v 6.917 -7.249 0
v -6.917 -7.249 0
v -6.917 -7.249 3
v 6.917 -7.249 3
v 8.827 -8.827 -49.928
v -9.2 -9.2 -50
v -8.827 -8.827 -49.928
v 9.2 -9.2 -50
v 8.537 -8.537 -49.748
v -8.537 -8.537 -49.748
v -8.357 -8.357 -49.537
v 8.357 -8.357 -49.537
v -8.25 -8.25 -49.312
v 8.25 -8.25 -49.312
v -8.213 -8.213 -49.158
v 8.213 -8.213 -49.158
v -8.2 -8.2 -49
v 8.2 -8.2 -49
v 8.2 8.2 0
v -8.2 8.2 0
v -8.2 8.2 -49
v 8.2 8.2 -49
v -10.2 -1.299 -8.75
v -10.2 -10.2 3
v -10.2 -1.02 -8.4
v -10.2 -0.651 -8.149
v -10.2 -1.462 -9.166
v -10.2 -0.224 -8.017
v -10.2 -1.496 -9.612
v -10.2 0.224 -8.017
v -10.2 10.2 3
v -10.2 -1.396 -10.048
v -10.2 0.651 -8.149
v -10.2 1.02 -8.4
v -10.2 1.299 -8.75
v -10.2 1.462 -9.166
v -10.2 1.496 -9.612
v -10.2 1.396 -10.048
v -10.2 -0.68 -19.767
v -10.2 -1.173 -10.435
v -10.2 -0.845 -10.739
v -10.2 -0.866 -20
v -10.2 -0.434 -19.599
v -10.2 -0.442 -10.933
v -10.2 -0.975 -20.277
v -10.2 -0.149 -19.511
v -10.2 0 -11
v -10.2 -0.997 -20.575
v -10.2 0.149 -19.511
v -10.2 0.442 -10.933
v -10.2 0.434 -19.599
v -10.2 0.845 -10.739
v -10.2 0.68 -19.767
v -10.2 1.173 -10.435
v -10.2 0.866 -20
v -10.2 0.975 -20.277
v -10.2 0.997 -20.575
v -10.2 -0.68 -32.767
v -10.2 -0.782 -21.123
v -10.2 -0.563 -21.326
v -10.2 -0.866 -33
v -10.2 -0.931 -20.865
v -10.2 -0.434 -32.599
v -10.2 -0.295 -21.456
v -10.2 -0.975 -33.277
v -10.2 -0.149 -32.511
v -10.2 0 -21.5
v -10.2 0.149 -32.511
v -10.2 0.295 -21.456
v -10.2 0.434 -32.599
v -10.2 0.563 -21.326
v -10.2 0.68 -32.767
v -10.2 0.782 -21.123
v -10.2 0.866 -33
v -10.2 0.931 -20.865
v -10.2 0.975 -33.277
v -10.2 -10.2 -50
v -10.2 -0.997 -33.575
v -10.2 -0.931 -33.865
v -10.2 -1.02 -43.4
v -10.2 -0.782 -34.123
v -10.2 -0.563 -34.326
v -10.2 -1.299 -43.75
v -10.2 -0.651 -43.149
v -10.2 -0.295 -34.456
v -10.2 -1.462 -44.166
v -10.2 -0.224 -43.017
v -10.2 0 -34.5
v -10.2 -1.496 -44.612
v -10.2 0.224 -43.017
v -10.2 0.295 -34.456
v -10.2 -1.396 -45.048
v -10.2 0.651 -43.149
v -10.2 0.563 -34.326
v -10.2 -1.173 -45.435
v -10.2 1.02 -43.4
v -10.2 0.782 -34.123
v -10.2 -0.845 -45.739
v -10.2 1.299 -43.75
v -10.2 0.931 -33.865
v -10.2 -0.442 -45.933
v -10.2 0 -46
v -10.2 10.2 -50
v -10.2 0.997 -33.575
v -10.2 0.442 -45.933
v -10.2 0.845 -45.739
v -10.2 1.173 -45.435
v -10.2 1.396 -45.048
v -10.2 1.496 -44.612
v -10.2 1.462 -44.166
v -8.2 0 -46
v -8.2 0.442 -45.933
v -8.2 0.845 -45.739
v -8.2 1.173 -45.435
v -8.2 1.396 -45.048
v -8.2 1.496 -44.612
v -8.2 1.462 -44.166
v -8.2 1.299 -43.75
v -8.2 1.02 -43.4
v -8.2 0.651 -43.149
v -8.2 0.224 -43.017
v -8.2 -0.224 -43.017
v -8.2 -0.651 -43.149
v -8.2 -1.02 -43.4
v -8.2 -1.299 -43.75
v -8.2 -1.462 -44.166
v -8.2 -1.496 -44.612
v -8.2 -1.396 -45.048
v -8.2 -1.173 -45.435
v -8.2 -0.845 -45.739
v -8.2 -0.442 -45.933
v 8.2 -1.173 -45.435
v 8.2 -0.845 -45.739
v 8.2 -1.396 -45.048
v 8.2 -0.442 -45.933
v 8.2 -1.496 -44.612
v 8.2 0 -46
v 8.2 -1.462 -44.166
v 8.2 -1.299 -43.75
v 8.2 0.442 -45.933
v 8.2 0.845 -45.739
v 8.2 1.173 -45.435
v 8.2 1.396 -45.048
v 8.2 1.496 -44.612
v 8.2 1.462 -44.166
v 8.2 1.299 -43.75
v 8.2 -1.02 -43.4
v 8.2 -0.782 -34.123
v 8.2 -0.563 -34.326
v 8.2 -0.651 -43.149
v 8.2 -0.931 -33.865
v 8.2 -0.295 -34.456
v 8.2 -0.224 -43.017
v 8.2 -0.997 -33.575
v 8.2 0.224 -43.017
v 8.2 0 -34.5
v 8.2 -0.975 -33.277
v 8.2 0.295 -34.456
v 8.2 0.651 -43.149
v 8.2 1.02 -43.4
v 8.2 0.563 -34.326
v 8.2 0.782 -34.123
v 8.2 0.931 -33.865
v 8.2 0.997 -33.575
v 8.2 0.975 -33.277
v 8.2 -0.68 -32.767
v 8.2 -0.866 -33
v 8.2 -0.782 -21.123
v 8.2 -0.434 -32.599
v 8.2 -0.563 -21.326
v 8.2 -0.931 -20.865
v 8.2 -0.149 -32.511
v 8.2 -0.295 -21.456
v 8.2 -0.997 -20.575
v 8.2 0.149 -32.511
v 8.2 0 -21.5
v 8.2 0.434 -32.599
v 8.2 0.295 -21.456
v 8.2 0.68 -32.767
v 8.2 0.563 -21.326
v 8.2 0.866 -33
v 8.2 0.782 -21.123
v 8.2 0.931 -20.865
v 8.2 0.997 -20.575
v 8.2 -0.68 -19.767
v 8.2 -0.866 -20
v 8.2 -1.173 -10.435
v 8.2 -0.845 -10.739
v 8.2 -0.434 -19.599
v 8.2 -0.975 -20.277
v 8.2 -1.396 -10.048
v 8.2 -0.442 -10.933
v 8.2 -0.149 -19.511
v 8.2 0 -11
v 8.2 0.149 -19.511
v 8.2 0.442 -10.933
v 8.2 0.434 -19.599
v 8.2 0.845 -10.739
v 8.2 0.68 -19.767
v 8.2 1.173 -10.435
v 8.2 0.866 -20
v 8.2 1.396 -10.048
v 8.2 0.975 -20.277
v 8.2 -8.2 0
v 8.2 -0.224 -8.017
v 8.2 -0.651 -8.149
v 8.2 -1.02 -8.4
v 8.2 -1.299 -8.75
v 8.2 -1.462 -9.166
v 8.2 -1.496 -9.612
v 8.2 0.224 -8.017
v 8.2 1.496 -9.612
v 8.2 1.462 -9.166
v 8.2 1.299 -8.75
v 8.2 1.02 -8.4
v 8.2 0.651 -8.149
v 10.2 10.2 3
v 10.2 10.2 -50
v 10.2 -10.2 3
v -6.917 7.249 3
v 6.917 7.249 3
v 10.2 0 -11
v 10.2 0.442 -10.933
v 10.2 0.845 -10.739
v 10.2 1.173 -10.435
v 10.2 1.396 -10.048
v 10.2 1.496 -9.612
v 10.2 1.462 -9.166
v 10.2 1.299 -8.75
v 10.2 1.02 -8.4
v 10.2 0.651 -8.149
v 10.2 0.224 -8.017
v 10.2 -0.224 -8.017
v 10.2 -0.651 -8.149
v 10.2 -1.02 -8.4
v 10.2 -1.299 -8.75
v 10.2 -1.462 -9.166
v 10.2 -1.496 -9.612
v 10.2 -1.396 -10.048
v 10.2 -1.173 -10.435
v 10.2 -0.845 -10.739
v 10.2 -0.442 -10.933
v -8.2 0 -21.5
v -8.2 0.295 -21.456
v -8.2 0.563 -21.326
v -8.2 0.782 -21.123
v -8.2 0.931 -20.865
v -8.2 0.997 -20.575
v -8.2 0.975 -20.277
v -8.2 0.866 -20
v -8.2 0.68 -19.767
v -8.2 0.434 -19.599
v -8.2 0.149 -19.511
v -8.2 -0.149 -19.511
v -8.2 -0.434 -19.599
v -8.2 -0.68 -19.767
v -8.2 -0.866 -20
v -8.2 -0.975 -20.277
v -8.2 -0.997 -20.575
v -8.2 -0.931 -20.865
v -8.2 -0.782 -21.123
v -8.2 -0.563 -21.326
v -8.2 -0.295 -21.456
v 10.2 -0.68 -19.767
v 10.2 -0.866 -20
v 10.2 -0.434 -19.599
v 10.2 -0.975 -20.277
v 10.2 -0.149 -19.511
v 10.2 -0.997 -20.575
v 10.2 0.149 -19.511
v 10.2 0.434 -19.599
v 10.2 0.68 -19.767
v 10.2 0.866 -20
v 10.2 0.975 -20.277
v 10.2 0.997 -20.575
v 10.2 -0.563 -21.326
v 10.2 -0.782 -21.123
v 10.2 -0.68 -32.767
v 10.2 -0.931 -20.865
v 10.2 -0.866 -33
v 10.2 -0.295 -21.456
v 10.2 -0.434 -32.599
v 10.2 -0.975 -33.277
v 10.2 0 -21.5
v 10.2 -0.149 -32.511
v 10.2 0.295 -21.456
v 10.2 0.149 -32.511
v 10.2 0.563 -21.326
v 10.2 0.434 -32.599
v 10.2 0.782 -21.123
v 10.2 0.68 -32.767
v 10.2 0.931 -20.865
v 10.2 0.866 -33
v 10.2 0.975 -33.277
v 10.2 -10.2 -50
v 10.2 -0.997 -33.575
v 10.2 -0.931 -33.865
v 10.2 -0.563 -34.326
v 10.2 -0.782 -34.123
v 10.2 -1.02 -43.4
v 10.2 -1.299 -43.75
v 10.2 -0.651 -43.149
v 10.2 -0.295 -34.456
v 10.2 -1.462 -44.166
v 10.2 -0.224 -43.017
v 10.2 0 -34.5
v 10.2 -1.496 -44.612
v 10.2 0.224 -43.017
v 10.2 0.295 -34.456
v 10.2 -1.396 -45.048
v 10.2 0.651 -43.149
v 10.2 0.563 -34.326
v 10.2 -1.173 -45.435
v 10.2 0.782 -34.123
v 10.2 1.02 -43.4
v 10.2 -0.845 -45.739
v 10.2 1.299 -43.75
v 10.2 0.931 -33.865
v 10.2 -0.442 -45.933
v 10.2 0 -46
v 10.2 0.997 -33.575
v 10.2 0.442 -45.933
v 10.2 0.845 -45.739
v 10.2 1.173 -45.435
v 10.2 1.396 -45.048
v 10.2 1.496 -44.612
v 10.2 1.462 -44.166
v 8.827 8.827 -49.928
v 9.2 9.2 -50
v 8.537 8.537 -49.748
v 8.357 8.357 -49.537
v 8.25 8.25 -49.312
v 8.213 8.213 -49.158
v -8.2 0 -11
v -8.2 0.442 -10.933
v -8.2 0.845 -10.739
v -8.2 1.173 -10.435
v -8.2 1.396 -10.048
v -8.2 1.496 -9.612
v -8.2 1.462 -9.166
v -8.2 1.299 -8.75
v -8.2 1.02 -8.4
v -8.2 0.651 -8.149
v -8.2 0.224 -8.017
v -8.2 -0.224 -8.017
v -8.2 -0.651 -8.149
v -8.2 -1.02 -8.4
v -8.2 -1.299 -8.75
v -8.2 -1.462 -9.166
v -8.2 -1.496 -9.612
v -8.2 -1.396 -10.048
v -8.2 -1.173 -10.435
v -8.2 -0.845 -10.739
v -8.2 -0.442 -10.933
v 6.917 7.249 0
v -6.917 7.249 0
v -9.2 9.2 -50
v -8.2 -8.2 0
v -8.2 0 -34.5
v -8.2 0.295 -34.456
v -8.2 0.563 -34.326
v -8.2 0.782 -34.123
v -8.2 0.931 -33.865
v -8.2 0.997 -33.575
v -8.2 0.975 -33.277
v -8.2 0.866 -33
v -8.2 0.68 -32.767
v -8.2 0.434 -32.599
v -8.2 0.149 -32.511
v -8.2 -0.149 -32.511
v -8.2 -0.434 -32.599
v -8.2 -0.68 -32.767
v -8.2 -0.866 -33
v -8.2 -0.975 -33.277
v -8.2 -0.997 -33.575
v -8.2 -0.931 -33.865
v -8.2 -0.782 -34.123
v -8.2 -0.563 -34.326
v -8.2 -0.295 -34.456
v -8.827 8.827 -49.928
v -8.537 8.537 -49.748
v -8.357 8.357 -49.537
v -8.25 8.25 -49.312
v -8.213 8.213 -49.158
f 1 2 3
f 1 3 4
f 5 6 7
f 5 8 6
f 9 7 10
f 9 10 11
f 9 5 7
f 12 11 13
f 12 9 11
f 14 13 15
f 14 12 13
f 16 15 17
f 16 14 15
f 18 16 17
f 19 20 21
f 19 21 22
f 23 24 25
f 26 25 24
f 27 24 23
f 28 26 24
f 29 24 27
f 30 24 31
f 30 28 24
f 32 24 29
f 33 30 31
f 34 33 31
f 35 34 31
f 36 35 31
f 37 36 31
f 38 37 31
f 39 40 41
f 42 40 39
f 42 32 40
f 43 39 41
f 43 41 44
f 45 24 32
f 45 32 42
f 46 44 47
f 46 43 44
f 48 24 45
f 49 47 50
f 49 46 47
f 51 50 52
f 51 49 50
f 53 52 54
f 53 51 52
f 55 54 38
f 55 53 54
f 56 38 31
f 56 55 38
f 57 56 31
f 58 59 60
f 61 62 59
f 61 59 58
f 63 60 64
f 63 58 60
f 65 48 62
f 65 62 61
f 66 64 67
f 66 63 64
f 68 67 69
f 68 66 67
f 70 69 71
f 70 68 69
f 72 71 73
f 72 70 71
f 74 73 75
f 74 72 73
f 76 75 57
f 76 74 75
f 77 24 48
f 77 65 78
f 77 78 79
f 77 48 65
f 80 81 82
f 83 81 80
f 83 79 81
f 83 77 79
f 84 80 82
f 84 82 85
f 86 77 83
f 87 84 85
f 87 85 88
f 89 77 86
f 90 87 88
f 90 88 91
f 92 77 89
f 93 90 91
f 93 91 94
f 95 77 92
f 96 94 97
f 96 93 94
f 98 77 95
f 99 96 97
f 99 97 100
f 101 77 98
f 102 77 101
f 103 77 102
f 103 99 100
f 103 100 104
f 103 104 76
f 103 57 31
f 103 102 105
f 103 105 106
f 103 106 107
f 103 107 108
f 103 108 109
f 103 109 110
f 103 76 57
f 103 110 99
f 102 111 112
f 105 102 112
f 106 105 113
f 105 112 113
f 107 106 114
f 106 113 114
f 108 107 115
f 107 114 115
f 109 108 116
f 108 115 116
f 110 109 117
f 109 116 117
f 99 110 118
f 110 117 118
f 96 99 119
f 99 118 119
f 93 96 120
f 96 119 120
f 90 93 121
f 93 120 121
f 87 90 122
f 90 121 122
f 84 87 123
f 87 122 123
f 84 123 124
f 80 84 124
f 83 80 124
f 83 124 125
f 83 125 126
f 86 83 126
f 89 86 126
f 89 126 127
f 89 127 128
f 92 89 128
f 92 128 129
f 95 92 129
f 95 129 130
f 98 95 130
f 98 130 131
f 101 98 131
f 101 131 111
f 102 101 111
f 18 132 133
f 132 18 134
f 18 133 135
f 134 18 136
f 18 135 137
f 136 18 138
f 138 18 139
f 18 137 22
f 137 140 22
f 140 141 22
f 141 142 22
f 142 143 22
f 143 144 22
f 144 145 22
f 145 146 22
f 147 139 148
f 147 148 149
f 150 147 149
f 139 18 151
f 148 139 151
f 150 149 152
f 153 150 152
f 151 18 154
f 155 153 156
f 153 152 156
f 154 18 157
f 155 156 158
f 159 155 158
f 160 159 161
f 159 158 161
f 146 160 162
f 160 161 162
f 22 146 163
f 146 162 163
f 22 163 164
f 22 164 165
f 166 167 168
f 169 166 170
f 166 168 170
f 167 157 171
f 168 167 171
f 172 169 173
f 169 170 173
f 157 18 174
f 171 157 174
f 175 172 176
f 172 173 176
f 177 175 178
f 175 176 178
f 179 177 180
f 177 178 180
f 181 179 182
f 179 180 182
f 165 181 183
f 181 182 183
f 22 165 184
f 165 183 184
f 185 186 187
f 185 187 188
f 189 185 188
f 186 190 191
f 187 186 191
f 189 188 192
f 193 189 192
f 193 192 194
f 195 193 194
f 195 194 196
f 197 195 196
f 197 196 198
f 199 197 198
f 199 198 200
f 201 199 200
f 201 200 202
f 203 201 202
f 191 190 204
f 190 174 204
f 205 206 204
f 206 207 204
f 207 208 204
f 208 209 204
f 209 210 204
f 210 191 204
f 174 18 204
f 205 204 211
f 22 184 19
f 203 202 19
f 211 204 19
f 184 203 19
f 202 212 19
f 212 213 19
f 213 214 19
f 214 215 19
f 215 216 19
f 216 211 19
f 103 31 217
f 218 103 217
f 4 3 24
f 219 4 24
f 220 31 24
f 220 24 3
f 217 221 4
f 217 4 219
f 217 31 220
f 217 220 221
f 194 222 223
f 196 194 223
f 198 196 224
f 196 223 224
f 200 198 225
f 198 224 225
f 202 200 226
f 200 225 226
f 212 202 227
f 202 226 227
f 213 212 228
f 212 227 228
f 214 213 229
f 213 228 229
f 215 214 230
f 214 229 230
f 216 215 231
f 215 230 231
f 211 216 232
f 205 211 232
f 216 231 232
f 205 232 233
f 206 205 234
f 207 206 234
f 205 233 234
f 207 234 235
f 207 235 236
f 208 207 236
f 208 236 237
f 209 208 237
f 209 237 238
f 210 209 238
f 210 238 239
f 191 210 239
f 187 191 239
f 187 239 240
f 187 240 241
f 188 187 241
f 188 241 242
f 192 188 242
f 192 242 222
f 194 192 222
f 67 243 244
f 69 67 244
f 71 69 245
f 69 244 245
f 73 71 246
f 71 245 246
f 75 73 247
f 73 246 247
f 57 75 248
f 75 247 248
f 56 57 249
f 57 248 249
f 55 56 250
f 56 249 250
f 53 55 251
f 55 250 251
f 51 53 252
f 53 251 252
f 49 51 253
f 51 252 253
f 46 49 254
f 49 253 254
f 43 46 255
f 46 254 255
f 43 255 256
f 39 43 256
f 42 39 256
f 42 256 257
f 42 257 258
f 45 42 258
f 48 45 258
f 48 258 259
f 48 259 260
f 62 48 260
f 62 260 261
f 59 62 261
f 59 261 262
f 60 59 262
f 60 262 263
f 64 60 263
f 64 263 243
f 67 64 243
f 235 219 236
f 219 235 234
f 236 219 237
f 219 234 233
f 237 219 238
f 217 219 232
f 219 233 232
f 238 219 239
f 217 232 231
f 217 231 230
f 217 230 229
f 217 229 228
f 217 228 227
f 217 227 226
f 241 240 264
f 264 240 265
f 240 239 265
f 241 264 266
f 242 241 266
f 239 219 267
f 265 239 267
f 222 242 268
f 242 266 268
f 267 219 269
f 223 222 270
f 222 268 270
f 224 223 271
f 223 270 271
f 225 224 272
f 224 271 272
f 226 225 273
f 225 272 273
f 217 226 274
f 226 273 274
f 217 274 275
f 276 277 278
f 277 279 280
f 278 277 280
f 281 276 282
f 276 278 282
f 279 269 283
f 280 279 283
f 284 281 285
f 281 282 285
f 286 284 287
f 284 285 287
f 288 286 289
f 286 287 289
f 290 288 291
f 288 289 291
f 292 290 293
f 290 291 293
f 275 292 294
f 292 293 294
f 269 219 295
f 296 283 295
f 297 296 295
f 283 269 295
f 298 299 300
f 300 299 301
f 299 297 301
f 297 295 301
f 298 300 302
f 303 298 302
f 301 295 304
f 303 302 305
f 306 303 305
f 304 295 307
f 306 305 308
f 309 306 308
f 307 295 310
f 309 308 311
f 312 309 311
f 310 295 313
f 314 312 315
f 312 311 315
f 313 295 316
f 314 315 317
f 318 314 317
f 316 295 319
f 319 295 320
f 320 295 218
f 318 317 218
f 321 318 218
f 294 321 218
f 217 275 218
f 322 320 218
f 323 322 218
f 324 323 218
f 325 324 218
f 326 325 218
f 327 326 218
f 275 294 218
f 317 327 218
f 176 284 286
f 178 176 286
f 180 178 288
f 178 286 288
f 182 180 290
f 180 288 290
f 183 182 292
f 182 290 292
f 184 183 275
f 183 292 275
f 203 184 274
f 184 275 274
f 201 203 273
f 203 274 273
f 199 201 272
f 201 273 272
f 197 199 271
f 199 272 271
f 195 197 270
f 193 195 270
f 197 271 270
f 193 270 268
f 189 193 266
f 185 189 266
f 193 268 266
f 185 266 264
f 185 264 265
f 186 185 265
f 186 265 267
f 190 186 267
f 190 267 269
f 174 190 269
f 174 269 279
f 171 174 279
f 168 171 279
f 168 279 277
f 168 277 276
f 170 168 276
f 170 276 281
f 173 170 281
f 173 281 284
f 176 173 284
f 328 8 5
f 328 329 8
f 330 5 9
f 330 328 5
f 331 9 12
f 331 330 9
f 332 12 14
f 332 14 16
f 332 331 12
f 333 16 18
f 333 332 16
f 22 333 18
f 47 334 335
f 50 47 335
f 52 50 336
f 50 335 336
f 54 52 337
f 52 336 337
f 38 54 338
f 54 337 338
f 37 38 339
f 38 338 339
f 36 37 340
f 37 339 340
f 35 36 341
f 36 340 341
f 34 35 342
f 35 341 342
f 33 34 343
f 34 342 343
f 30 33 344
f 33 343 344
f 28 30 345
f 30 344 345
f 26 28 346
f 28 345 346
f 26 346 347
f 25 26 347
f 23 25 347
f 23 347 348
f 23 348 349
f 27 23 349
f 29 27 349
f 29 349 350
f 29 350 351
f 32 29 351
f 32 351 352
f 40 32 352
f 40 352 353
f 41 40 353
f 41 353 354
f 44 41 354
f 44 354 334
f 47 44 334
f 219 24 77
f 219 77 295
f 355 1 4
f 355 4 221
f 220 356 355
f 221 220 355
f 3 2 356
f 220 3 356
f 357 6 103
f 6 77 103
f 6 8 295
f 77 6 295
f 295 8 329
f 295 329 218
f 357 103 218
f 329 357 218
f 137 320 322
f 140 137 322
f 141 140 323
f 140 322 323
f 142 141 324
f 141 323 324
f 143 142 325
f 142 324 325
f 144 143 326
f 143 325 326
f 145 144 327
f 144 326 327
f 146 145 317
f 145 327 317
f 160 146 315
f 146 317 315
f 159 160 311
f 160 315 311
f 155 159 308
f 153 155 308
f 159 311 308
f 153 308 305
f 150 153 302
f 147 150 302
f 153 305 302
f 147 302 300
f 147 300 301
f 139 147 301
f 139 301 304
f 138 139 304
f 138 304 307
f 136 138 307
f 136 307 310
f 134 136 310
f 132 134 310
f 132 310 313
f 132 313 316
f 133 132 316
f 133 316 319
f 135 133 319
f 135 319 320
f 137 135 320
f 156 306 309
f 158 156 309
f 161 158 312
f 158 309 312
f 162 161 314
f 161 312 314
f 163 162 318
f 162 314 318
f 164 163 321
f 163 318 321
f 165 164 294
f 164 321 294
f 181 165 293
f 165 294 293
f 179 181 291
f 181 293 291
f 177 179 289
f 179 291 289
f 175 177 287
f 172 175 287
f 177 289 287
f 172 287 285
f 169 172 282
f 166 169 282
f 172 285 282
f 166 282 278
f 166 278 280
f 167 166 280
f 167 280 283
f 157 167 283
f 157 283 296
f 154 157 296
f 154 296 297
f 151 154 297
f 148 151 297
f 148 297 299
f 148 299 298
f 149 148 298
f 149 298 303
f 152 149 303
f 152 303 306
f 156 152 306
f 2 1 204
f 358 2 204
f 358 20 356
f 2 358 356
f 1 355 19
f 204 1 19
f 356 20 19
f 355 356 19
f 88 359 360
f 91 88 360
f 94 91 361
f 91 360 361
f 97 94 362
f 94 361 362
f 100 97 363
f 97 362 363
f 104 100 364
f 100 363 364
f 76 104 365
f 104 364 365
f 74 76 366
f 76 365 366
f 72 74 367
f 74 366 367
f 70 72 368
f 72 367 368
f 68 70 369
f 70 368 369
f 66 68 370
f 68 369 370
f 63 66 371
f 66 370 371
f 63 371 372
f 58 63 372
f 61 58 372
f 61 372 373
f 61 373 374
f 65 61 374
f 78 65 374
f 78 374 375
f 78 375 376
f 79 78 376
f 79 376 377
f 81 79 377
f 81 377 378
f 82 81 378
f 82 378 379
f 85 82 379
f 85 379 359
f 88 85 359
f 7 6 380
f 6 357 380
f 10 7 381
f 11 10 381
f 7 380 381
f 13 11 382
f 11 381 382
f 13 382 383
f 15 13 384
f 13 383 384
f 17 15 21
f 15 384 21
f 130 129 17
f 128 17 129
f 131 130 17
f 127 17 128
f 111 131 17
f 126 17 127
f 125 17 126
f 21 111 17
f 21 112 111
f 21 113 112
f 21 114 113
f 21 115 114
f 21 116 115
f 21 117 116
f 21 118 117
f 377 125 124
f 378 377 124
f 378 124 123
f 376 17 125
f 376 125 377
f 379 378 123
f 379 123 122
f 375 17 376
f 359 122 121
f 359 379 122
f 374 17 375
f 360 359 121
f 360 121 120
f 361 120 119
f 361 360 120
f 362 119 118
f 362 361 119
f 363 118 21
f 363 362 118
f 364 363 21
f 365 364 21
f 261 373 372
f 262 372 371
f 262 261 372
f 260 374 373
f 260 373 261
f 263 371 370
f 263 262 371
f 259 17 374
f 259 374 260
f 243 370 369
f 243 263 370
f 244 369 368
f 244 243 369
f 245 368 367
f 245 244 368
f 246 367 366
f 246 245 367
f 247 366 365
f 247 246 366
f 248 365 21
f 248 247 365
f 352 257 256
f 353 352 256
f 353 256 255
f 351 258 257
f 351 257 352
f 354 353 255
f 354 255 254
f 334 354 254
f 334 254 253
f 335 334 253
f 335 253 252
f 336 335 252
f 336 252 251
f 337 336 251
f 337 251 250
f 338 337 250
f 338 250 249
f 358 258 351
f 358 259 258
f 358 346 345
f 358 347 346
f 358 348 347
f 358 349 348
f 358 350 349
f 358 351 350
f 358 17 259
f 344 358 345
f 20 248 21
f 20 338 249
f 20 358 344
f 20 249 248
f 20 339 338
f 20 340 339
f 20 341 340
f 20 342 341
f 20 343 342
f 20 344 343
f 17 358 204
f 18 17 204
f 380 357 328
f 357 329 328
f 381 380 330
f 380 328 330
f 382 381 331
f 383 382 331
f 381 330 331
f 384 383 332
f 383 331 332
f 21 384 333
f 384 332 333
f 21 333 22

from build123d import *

# Parameters (mm, degrees)
SKETCH1_W           = 20.4
SKETCH1_H           = 20.4
SKETCH1_W_2         = 16.4
SKETCH1_H_2         = 16.4
BOSS_EXTRUDE1_DEPTH = 50
SKETCH2_W           = 20.4
SKETCH2_H           = 20.4
SKETCH2_W_2         = 13.834702386
SKETCH2_H_2         = 14.497254018
BOSS_EXTRUDE2_DEPTH = 3
SKETCH3_R           = 1
SKETCH3_R_2         = 1.5
CUT_EXTRUDE1_DEPTH  = 55.956346312
FILLET1_R           = 1


with BuildPart() as part:
    # Sketch1 → Boss-Extrude1 (new body)
    with BuildSketch(Plane.XY):
        Rectangle(SKETCH1_W, SKETCH1_H)
        Rectangle(SKETCH1_W_2, SKETCH1_H_2, mode=Mode.SUBTRACT)
    extrude(amount=-BOSS_EXTRUDE1_DEPTH)

    # Sketch2 → Boss-Extrude2 (add)
    with BuildSketch(Plane.XY):
        Rectangle(SKETCH2_W, SKETCH2_H)
        Rectangle(SKETCH2_W_2, SKETCH2_H_2, mode=Mode.SUBTRACT)
    extrude(amount=BOSS_EXTRUDE2_DEPTH)

    # Sketch3 → Cut-Extrude1 (cut, through all)
    with BuildSketch(Plane(origin=(10.2, 0, 0), x_dir=(0, 0, -1), z_dir=(1, 0, 0))):
        with Locations((20.5, 0)):
            Circle(SKETCH3_R)
        with Locations((9.5, 0)):
            Circle(SKETCH3_R_2)
        with Locations((33.5, 0)):
            Circle(SKETCH3_R)
        with Locations((44.5, 0)):
            Circle(SKETCH3_R_2)
    extrude(amount=-CUT_EXTRUDE1_DEPTH, mode=Mode.SUBTRACT)

    # Fillet1
    fillet1_edges = [part.edges().sort_by_distance(p)[0] for p in [
        (8.2, 0, -50),
        (0, -8.2, -50),
        (-8.2, 0, -50),
        (0, 8.2, -50),
    ]]
    fillet(fillet1_edges, radius=FILLET1_R)


solid = part.part
